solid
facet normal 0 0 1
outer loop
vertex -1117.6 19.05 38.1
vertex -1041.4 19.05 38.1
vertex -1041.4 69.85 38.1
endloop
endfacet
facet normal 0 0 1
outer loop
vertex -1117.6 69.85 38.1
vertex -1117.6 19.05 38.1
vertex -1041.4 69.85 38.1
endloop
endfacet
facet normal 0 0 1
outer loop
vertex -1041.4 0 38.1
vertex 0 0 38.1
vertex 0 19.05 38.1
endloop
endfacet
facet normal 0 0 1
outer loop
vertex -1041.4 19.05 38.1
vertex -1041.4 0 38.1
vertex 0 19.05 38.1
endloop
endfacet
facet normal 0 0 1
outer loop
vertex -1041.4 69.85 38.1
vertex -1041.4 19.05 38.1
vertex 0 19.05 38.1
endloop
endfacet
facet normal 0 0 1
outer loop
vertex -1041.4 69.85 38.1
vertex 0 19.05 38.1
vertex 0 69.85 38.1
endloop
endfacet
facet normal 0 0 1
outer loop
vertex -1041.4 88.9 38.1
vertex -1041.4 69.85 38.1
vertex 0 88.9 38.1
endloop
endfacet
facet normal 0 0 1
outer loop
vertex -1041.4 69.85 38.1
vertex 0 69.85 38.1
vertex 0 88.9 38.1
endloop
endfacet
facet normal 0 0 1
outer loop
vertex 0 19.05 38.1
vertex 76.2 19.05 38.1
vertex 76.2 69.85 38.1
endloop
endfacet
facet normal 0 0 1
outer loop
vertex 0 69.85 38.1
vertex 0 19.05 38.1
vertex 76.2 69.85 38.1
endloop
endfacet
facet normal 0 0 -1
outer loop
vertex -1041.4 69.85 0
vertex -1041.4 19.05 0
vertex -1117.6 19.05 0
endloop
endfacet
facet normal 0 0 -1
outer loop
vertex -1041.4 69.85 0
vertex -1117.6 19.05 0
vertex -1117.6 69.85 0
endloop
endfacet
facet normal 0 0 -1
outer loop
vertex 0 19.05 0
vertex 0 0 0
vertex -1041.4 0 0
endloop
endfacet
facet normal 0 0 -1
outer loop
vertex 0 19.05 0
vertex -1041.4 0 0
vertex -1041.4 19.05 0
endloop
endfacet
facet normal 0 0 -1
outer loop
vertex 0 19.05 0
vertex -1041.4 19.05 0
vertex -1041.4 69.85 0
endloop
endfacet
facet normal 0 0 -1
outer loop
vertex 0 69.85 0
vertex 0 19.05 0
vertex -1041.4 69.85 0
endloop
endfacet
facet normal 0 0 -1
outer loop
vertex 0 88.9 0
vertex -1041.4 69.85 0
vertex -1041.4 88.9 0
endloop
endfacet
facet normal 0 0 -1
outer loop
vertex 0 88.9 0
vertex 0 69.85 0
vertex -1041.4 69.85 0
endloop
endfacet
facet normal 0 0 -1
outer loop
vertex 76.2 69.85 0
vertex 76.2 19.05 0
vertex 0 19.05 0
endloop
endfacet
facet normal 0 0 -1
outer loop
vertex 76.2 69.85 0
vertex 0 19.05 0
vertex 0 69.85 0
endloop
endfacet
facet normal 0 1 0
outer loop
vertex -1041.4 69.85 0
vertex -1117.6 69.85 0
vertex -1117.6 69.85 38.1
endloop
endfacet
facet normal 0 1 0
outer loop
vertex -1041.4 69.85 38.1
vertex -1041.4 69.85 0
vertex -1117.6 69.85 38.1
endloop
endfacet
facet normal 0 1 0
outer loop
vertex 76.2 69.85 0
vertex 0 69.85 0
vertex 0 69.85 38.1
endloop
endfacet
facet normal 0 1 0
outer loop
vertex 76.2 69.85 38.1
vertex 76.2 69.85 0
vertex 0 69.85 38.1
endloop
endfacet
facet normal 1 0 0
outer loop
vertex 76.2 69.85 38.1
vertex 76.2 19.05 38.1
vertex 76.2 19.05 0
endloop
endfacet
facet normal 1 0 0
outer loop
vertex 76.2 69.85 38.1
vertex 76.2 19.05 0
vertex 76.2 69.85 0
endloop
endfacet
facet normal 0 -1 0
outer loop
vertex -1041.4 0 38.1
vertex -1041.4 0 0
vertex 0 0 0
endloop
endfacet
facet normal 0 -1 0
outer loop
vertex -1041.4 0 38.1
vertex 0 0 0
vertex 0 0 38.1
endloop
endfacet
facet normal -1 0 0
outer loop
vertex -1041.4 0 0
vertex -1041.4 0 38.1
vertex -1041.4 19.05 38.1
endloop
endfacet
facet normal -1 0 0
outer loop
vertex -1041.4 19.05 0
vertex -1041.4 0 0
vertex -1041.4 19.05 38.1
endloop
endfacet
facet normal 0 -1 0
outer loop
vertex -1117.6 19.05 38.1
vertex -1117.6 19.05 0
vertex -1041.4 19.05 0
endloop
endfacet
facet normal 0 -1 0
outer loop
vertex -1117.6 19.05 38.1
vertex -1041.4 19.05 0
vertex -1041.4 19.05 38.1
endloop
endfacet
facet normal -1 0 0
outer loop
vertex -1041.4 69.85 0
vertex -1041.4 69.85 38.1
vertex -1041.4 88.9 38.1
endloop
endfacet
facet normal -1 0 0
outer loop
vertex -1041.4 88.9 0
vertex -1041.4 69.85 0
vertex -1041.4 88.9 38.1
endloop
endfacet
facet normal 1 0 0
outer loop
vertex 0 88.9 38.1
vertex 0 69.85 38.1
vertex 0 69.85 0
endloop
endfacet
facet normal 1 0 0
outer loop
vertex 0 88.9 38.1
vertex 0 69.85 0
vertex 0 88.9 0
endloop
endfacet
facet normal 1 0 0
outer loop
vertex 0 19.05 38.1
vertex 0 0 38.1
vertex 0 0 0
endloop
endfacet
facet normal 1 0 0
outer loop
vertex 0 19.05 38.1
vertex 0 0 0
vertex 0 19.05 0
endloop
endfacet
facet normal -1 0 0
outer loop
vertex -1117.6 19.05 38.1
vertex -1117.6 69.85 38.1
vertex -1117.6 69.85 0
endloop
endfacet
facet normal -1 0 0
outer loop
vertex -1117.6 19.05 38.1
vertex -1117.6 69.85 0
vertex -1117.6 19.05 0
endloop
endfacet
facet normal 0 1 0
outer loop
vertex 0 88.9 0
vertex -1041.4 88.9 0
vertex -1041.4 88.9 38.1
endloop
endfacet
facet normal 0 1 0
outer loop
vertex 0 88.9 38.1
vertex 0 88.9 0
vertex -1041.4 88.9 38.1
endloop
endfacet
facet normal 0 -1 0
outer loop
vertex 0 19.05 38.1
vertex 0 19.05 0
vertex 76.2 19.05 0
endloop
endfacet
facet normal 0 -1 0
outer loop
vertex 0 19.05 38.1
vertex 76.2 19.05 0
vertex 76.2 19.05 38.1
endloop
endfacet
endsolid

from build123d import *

# Parameters (mm, degrees)
F0_W     = 88.9
F0_H     = 38.1
F1_DEPTH = 1041.4
F2_W     = 50.8
F2_H     = 38.1
F3_DEPTH = 76.2
F4_W     = 50.8
F4_H     = 38.1
F5_DEPTH = 76.2


with BuildPart() as f1:
    # F0 (on Right) → F1 (new body)
    with BuildSketch(Plane.YZ):
        with Locations((44.45, 19.05)):
            Rectangle(F0_W, F0_H)
    extrude(amount=-F1_DEPTH)

    # F2 (on face) → F3 (join)
    with BuildSketch(Plane.YZ):
        with Locations((44.45, 19.05)):
            Rectangle(F2_W, F2_H)
    extrude(amount=F3_DEPTH)

    # F4 (on face) → F5 (join)
    with BuildSketch(Plane(origin=(-1041.4, 0, 0), x_dir=(0, -1, 0), z_dir=(-1, 0, 0))):
        with Locations((-44.45, 19.05)):
            Rectangle(F4_W, F4_H)
    extrude(amount=F5_DEPTH)


solid = f1.part
